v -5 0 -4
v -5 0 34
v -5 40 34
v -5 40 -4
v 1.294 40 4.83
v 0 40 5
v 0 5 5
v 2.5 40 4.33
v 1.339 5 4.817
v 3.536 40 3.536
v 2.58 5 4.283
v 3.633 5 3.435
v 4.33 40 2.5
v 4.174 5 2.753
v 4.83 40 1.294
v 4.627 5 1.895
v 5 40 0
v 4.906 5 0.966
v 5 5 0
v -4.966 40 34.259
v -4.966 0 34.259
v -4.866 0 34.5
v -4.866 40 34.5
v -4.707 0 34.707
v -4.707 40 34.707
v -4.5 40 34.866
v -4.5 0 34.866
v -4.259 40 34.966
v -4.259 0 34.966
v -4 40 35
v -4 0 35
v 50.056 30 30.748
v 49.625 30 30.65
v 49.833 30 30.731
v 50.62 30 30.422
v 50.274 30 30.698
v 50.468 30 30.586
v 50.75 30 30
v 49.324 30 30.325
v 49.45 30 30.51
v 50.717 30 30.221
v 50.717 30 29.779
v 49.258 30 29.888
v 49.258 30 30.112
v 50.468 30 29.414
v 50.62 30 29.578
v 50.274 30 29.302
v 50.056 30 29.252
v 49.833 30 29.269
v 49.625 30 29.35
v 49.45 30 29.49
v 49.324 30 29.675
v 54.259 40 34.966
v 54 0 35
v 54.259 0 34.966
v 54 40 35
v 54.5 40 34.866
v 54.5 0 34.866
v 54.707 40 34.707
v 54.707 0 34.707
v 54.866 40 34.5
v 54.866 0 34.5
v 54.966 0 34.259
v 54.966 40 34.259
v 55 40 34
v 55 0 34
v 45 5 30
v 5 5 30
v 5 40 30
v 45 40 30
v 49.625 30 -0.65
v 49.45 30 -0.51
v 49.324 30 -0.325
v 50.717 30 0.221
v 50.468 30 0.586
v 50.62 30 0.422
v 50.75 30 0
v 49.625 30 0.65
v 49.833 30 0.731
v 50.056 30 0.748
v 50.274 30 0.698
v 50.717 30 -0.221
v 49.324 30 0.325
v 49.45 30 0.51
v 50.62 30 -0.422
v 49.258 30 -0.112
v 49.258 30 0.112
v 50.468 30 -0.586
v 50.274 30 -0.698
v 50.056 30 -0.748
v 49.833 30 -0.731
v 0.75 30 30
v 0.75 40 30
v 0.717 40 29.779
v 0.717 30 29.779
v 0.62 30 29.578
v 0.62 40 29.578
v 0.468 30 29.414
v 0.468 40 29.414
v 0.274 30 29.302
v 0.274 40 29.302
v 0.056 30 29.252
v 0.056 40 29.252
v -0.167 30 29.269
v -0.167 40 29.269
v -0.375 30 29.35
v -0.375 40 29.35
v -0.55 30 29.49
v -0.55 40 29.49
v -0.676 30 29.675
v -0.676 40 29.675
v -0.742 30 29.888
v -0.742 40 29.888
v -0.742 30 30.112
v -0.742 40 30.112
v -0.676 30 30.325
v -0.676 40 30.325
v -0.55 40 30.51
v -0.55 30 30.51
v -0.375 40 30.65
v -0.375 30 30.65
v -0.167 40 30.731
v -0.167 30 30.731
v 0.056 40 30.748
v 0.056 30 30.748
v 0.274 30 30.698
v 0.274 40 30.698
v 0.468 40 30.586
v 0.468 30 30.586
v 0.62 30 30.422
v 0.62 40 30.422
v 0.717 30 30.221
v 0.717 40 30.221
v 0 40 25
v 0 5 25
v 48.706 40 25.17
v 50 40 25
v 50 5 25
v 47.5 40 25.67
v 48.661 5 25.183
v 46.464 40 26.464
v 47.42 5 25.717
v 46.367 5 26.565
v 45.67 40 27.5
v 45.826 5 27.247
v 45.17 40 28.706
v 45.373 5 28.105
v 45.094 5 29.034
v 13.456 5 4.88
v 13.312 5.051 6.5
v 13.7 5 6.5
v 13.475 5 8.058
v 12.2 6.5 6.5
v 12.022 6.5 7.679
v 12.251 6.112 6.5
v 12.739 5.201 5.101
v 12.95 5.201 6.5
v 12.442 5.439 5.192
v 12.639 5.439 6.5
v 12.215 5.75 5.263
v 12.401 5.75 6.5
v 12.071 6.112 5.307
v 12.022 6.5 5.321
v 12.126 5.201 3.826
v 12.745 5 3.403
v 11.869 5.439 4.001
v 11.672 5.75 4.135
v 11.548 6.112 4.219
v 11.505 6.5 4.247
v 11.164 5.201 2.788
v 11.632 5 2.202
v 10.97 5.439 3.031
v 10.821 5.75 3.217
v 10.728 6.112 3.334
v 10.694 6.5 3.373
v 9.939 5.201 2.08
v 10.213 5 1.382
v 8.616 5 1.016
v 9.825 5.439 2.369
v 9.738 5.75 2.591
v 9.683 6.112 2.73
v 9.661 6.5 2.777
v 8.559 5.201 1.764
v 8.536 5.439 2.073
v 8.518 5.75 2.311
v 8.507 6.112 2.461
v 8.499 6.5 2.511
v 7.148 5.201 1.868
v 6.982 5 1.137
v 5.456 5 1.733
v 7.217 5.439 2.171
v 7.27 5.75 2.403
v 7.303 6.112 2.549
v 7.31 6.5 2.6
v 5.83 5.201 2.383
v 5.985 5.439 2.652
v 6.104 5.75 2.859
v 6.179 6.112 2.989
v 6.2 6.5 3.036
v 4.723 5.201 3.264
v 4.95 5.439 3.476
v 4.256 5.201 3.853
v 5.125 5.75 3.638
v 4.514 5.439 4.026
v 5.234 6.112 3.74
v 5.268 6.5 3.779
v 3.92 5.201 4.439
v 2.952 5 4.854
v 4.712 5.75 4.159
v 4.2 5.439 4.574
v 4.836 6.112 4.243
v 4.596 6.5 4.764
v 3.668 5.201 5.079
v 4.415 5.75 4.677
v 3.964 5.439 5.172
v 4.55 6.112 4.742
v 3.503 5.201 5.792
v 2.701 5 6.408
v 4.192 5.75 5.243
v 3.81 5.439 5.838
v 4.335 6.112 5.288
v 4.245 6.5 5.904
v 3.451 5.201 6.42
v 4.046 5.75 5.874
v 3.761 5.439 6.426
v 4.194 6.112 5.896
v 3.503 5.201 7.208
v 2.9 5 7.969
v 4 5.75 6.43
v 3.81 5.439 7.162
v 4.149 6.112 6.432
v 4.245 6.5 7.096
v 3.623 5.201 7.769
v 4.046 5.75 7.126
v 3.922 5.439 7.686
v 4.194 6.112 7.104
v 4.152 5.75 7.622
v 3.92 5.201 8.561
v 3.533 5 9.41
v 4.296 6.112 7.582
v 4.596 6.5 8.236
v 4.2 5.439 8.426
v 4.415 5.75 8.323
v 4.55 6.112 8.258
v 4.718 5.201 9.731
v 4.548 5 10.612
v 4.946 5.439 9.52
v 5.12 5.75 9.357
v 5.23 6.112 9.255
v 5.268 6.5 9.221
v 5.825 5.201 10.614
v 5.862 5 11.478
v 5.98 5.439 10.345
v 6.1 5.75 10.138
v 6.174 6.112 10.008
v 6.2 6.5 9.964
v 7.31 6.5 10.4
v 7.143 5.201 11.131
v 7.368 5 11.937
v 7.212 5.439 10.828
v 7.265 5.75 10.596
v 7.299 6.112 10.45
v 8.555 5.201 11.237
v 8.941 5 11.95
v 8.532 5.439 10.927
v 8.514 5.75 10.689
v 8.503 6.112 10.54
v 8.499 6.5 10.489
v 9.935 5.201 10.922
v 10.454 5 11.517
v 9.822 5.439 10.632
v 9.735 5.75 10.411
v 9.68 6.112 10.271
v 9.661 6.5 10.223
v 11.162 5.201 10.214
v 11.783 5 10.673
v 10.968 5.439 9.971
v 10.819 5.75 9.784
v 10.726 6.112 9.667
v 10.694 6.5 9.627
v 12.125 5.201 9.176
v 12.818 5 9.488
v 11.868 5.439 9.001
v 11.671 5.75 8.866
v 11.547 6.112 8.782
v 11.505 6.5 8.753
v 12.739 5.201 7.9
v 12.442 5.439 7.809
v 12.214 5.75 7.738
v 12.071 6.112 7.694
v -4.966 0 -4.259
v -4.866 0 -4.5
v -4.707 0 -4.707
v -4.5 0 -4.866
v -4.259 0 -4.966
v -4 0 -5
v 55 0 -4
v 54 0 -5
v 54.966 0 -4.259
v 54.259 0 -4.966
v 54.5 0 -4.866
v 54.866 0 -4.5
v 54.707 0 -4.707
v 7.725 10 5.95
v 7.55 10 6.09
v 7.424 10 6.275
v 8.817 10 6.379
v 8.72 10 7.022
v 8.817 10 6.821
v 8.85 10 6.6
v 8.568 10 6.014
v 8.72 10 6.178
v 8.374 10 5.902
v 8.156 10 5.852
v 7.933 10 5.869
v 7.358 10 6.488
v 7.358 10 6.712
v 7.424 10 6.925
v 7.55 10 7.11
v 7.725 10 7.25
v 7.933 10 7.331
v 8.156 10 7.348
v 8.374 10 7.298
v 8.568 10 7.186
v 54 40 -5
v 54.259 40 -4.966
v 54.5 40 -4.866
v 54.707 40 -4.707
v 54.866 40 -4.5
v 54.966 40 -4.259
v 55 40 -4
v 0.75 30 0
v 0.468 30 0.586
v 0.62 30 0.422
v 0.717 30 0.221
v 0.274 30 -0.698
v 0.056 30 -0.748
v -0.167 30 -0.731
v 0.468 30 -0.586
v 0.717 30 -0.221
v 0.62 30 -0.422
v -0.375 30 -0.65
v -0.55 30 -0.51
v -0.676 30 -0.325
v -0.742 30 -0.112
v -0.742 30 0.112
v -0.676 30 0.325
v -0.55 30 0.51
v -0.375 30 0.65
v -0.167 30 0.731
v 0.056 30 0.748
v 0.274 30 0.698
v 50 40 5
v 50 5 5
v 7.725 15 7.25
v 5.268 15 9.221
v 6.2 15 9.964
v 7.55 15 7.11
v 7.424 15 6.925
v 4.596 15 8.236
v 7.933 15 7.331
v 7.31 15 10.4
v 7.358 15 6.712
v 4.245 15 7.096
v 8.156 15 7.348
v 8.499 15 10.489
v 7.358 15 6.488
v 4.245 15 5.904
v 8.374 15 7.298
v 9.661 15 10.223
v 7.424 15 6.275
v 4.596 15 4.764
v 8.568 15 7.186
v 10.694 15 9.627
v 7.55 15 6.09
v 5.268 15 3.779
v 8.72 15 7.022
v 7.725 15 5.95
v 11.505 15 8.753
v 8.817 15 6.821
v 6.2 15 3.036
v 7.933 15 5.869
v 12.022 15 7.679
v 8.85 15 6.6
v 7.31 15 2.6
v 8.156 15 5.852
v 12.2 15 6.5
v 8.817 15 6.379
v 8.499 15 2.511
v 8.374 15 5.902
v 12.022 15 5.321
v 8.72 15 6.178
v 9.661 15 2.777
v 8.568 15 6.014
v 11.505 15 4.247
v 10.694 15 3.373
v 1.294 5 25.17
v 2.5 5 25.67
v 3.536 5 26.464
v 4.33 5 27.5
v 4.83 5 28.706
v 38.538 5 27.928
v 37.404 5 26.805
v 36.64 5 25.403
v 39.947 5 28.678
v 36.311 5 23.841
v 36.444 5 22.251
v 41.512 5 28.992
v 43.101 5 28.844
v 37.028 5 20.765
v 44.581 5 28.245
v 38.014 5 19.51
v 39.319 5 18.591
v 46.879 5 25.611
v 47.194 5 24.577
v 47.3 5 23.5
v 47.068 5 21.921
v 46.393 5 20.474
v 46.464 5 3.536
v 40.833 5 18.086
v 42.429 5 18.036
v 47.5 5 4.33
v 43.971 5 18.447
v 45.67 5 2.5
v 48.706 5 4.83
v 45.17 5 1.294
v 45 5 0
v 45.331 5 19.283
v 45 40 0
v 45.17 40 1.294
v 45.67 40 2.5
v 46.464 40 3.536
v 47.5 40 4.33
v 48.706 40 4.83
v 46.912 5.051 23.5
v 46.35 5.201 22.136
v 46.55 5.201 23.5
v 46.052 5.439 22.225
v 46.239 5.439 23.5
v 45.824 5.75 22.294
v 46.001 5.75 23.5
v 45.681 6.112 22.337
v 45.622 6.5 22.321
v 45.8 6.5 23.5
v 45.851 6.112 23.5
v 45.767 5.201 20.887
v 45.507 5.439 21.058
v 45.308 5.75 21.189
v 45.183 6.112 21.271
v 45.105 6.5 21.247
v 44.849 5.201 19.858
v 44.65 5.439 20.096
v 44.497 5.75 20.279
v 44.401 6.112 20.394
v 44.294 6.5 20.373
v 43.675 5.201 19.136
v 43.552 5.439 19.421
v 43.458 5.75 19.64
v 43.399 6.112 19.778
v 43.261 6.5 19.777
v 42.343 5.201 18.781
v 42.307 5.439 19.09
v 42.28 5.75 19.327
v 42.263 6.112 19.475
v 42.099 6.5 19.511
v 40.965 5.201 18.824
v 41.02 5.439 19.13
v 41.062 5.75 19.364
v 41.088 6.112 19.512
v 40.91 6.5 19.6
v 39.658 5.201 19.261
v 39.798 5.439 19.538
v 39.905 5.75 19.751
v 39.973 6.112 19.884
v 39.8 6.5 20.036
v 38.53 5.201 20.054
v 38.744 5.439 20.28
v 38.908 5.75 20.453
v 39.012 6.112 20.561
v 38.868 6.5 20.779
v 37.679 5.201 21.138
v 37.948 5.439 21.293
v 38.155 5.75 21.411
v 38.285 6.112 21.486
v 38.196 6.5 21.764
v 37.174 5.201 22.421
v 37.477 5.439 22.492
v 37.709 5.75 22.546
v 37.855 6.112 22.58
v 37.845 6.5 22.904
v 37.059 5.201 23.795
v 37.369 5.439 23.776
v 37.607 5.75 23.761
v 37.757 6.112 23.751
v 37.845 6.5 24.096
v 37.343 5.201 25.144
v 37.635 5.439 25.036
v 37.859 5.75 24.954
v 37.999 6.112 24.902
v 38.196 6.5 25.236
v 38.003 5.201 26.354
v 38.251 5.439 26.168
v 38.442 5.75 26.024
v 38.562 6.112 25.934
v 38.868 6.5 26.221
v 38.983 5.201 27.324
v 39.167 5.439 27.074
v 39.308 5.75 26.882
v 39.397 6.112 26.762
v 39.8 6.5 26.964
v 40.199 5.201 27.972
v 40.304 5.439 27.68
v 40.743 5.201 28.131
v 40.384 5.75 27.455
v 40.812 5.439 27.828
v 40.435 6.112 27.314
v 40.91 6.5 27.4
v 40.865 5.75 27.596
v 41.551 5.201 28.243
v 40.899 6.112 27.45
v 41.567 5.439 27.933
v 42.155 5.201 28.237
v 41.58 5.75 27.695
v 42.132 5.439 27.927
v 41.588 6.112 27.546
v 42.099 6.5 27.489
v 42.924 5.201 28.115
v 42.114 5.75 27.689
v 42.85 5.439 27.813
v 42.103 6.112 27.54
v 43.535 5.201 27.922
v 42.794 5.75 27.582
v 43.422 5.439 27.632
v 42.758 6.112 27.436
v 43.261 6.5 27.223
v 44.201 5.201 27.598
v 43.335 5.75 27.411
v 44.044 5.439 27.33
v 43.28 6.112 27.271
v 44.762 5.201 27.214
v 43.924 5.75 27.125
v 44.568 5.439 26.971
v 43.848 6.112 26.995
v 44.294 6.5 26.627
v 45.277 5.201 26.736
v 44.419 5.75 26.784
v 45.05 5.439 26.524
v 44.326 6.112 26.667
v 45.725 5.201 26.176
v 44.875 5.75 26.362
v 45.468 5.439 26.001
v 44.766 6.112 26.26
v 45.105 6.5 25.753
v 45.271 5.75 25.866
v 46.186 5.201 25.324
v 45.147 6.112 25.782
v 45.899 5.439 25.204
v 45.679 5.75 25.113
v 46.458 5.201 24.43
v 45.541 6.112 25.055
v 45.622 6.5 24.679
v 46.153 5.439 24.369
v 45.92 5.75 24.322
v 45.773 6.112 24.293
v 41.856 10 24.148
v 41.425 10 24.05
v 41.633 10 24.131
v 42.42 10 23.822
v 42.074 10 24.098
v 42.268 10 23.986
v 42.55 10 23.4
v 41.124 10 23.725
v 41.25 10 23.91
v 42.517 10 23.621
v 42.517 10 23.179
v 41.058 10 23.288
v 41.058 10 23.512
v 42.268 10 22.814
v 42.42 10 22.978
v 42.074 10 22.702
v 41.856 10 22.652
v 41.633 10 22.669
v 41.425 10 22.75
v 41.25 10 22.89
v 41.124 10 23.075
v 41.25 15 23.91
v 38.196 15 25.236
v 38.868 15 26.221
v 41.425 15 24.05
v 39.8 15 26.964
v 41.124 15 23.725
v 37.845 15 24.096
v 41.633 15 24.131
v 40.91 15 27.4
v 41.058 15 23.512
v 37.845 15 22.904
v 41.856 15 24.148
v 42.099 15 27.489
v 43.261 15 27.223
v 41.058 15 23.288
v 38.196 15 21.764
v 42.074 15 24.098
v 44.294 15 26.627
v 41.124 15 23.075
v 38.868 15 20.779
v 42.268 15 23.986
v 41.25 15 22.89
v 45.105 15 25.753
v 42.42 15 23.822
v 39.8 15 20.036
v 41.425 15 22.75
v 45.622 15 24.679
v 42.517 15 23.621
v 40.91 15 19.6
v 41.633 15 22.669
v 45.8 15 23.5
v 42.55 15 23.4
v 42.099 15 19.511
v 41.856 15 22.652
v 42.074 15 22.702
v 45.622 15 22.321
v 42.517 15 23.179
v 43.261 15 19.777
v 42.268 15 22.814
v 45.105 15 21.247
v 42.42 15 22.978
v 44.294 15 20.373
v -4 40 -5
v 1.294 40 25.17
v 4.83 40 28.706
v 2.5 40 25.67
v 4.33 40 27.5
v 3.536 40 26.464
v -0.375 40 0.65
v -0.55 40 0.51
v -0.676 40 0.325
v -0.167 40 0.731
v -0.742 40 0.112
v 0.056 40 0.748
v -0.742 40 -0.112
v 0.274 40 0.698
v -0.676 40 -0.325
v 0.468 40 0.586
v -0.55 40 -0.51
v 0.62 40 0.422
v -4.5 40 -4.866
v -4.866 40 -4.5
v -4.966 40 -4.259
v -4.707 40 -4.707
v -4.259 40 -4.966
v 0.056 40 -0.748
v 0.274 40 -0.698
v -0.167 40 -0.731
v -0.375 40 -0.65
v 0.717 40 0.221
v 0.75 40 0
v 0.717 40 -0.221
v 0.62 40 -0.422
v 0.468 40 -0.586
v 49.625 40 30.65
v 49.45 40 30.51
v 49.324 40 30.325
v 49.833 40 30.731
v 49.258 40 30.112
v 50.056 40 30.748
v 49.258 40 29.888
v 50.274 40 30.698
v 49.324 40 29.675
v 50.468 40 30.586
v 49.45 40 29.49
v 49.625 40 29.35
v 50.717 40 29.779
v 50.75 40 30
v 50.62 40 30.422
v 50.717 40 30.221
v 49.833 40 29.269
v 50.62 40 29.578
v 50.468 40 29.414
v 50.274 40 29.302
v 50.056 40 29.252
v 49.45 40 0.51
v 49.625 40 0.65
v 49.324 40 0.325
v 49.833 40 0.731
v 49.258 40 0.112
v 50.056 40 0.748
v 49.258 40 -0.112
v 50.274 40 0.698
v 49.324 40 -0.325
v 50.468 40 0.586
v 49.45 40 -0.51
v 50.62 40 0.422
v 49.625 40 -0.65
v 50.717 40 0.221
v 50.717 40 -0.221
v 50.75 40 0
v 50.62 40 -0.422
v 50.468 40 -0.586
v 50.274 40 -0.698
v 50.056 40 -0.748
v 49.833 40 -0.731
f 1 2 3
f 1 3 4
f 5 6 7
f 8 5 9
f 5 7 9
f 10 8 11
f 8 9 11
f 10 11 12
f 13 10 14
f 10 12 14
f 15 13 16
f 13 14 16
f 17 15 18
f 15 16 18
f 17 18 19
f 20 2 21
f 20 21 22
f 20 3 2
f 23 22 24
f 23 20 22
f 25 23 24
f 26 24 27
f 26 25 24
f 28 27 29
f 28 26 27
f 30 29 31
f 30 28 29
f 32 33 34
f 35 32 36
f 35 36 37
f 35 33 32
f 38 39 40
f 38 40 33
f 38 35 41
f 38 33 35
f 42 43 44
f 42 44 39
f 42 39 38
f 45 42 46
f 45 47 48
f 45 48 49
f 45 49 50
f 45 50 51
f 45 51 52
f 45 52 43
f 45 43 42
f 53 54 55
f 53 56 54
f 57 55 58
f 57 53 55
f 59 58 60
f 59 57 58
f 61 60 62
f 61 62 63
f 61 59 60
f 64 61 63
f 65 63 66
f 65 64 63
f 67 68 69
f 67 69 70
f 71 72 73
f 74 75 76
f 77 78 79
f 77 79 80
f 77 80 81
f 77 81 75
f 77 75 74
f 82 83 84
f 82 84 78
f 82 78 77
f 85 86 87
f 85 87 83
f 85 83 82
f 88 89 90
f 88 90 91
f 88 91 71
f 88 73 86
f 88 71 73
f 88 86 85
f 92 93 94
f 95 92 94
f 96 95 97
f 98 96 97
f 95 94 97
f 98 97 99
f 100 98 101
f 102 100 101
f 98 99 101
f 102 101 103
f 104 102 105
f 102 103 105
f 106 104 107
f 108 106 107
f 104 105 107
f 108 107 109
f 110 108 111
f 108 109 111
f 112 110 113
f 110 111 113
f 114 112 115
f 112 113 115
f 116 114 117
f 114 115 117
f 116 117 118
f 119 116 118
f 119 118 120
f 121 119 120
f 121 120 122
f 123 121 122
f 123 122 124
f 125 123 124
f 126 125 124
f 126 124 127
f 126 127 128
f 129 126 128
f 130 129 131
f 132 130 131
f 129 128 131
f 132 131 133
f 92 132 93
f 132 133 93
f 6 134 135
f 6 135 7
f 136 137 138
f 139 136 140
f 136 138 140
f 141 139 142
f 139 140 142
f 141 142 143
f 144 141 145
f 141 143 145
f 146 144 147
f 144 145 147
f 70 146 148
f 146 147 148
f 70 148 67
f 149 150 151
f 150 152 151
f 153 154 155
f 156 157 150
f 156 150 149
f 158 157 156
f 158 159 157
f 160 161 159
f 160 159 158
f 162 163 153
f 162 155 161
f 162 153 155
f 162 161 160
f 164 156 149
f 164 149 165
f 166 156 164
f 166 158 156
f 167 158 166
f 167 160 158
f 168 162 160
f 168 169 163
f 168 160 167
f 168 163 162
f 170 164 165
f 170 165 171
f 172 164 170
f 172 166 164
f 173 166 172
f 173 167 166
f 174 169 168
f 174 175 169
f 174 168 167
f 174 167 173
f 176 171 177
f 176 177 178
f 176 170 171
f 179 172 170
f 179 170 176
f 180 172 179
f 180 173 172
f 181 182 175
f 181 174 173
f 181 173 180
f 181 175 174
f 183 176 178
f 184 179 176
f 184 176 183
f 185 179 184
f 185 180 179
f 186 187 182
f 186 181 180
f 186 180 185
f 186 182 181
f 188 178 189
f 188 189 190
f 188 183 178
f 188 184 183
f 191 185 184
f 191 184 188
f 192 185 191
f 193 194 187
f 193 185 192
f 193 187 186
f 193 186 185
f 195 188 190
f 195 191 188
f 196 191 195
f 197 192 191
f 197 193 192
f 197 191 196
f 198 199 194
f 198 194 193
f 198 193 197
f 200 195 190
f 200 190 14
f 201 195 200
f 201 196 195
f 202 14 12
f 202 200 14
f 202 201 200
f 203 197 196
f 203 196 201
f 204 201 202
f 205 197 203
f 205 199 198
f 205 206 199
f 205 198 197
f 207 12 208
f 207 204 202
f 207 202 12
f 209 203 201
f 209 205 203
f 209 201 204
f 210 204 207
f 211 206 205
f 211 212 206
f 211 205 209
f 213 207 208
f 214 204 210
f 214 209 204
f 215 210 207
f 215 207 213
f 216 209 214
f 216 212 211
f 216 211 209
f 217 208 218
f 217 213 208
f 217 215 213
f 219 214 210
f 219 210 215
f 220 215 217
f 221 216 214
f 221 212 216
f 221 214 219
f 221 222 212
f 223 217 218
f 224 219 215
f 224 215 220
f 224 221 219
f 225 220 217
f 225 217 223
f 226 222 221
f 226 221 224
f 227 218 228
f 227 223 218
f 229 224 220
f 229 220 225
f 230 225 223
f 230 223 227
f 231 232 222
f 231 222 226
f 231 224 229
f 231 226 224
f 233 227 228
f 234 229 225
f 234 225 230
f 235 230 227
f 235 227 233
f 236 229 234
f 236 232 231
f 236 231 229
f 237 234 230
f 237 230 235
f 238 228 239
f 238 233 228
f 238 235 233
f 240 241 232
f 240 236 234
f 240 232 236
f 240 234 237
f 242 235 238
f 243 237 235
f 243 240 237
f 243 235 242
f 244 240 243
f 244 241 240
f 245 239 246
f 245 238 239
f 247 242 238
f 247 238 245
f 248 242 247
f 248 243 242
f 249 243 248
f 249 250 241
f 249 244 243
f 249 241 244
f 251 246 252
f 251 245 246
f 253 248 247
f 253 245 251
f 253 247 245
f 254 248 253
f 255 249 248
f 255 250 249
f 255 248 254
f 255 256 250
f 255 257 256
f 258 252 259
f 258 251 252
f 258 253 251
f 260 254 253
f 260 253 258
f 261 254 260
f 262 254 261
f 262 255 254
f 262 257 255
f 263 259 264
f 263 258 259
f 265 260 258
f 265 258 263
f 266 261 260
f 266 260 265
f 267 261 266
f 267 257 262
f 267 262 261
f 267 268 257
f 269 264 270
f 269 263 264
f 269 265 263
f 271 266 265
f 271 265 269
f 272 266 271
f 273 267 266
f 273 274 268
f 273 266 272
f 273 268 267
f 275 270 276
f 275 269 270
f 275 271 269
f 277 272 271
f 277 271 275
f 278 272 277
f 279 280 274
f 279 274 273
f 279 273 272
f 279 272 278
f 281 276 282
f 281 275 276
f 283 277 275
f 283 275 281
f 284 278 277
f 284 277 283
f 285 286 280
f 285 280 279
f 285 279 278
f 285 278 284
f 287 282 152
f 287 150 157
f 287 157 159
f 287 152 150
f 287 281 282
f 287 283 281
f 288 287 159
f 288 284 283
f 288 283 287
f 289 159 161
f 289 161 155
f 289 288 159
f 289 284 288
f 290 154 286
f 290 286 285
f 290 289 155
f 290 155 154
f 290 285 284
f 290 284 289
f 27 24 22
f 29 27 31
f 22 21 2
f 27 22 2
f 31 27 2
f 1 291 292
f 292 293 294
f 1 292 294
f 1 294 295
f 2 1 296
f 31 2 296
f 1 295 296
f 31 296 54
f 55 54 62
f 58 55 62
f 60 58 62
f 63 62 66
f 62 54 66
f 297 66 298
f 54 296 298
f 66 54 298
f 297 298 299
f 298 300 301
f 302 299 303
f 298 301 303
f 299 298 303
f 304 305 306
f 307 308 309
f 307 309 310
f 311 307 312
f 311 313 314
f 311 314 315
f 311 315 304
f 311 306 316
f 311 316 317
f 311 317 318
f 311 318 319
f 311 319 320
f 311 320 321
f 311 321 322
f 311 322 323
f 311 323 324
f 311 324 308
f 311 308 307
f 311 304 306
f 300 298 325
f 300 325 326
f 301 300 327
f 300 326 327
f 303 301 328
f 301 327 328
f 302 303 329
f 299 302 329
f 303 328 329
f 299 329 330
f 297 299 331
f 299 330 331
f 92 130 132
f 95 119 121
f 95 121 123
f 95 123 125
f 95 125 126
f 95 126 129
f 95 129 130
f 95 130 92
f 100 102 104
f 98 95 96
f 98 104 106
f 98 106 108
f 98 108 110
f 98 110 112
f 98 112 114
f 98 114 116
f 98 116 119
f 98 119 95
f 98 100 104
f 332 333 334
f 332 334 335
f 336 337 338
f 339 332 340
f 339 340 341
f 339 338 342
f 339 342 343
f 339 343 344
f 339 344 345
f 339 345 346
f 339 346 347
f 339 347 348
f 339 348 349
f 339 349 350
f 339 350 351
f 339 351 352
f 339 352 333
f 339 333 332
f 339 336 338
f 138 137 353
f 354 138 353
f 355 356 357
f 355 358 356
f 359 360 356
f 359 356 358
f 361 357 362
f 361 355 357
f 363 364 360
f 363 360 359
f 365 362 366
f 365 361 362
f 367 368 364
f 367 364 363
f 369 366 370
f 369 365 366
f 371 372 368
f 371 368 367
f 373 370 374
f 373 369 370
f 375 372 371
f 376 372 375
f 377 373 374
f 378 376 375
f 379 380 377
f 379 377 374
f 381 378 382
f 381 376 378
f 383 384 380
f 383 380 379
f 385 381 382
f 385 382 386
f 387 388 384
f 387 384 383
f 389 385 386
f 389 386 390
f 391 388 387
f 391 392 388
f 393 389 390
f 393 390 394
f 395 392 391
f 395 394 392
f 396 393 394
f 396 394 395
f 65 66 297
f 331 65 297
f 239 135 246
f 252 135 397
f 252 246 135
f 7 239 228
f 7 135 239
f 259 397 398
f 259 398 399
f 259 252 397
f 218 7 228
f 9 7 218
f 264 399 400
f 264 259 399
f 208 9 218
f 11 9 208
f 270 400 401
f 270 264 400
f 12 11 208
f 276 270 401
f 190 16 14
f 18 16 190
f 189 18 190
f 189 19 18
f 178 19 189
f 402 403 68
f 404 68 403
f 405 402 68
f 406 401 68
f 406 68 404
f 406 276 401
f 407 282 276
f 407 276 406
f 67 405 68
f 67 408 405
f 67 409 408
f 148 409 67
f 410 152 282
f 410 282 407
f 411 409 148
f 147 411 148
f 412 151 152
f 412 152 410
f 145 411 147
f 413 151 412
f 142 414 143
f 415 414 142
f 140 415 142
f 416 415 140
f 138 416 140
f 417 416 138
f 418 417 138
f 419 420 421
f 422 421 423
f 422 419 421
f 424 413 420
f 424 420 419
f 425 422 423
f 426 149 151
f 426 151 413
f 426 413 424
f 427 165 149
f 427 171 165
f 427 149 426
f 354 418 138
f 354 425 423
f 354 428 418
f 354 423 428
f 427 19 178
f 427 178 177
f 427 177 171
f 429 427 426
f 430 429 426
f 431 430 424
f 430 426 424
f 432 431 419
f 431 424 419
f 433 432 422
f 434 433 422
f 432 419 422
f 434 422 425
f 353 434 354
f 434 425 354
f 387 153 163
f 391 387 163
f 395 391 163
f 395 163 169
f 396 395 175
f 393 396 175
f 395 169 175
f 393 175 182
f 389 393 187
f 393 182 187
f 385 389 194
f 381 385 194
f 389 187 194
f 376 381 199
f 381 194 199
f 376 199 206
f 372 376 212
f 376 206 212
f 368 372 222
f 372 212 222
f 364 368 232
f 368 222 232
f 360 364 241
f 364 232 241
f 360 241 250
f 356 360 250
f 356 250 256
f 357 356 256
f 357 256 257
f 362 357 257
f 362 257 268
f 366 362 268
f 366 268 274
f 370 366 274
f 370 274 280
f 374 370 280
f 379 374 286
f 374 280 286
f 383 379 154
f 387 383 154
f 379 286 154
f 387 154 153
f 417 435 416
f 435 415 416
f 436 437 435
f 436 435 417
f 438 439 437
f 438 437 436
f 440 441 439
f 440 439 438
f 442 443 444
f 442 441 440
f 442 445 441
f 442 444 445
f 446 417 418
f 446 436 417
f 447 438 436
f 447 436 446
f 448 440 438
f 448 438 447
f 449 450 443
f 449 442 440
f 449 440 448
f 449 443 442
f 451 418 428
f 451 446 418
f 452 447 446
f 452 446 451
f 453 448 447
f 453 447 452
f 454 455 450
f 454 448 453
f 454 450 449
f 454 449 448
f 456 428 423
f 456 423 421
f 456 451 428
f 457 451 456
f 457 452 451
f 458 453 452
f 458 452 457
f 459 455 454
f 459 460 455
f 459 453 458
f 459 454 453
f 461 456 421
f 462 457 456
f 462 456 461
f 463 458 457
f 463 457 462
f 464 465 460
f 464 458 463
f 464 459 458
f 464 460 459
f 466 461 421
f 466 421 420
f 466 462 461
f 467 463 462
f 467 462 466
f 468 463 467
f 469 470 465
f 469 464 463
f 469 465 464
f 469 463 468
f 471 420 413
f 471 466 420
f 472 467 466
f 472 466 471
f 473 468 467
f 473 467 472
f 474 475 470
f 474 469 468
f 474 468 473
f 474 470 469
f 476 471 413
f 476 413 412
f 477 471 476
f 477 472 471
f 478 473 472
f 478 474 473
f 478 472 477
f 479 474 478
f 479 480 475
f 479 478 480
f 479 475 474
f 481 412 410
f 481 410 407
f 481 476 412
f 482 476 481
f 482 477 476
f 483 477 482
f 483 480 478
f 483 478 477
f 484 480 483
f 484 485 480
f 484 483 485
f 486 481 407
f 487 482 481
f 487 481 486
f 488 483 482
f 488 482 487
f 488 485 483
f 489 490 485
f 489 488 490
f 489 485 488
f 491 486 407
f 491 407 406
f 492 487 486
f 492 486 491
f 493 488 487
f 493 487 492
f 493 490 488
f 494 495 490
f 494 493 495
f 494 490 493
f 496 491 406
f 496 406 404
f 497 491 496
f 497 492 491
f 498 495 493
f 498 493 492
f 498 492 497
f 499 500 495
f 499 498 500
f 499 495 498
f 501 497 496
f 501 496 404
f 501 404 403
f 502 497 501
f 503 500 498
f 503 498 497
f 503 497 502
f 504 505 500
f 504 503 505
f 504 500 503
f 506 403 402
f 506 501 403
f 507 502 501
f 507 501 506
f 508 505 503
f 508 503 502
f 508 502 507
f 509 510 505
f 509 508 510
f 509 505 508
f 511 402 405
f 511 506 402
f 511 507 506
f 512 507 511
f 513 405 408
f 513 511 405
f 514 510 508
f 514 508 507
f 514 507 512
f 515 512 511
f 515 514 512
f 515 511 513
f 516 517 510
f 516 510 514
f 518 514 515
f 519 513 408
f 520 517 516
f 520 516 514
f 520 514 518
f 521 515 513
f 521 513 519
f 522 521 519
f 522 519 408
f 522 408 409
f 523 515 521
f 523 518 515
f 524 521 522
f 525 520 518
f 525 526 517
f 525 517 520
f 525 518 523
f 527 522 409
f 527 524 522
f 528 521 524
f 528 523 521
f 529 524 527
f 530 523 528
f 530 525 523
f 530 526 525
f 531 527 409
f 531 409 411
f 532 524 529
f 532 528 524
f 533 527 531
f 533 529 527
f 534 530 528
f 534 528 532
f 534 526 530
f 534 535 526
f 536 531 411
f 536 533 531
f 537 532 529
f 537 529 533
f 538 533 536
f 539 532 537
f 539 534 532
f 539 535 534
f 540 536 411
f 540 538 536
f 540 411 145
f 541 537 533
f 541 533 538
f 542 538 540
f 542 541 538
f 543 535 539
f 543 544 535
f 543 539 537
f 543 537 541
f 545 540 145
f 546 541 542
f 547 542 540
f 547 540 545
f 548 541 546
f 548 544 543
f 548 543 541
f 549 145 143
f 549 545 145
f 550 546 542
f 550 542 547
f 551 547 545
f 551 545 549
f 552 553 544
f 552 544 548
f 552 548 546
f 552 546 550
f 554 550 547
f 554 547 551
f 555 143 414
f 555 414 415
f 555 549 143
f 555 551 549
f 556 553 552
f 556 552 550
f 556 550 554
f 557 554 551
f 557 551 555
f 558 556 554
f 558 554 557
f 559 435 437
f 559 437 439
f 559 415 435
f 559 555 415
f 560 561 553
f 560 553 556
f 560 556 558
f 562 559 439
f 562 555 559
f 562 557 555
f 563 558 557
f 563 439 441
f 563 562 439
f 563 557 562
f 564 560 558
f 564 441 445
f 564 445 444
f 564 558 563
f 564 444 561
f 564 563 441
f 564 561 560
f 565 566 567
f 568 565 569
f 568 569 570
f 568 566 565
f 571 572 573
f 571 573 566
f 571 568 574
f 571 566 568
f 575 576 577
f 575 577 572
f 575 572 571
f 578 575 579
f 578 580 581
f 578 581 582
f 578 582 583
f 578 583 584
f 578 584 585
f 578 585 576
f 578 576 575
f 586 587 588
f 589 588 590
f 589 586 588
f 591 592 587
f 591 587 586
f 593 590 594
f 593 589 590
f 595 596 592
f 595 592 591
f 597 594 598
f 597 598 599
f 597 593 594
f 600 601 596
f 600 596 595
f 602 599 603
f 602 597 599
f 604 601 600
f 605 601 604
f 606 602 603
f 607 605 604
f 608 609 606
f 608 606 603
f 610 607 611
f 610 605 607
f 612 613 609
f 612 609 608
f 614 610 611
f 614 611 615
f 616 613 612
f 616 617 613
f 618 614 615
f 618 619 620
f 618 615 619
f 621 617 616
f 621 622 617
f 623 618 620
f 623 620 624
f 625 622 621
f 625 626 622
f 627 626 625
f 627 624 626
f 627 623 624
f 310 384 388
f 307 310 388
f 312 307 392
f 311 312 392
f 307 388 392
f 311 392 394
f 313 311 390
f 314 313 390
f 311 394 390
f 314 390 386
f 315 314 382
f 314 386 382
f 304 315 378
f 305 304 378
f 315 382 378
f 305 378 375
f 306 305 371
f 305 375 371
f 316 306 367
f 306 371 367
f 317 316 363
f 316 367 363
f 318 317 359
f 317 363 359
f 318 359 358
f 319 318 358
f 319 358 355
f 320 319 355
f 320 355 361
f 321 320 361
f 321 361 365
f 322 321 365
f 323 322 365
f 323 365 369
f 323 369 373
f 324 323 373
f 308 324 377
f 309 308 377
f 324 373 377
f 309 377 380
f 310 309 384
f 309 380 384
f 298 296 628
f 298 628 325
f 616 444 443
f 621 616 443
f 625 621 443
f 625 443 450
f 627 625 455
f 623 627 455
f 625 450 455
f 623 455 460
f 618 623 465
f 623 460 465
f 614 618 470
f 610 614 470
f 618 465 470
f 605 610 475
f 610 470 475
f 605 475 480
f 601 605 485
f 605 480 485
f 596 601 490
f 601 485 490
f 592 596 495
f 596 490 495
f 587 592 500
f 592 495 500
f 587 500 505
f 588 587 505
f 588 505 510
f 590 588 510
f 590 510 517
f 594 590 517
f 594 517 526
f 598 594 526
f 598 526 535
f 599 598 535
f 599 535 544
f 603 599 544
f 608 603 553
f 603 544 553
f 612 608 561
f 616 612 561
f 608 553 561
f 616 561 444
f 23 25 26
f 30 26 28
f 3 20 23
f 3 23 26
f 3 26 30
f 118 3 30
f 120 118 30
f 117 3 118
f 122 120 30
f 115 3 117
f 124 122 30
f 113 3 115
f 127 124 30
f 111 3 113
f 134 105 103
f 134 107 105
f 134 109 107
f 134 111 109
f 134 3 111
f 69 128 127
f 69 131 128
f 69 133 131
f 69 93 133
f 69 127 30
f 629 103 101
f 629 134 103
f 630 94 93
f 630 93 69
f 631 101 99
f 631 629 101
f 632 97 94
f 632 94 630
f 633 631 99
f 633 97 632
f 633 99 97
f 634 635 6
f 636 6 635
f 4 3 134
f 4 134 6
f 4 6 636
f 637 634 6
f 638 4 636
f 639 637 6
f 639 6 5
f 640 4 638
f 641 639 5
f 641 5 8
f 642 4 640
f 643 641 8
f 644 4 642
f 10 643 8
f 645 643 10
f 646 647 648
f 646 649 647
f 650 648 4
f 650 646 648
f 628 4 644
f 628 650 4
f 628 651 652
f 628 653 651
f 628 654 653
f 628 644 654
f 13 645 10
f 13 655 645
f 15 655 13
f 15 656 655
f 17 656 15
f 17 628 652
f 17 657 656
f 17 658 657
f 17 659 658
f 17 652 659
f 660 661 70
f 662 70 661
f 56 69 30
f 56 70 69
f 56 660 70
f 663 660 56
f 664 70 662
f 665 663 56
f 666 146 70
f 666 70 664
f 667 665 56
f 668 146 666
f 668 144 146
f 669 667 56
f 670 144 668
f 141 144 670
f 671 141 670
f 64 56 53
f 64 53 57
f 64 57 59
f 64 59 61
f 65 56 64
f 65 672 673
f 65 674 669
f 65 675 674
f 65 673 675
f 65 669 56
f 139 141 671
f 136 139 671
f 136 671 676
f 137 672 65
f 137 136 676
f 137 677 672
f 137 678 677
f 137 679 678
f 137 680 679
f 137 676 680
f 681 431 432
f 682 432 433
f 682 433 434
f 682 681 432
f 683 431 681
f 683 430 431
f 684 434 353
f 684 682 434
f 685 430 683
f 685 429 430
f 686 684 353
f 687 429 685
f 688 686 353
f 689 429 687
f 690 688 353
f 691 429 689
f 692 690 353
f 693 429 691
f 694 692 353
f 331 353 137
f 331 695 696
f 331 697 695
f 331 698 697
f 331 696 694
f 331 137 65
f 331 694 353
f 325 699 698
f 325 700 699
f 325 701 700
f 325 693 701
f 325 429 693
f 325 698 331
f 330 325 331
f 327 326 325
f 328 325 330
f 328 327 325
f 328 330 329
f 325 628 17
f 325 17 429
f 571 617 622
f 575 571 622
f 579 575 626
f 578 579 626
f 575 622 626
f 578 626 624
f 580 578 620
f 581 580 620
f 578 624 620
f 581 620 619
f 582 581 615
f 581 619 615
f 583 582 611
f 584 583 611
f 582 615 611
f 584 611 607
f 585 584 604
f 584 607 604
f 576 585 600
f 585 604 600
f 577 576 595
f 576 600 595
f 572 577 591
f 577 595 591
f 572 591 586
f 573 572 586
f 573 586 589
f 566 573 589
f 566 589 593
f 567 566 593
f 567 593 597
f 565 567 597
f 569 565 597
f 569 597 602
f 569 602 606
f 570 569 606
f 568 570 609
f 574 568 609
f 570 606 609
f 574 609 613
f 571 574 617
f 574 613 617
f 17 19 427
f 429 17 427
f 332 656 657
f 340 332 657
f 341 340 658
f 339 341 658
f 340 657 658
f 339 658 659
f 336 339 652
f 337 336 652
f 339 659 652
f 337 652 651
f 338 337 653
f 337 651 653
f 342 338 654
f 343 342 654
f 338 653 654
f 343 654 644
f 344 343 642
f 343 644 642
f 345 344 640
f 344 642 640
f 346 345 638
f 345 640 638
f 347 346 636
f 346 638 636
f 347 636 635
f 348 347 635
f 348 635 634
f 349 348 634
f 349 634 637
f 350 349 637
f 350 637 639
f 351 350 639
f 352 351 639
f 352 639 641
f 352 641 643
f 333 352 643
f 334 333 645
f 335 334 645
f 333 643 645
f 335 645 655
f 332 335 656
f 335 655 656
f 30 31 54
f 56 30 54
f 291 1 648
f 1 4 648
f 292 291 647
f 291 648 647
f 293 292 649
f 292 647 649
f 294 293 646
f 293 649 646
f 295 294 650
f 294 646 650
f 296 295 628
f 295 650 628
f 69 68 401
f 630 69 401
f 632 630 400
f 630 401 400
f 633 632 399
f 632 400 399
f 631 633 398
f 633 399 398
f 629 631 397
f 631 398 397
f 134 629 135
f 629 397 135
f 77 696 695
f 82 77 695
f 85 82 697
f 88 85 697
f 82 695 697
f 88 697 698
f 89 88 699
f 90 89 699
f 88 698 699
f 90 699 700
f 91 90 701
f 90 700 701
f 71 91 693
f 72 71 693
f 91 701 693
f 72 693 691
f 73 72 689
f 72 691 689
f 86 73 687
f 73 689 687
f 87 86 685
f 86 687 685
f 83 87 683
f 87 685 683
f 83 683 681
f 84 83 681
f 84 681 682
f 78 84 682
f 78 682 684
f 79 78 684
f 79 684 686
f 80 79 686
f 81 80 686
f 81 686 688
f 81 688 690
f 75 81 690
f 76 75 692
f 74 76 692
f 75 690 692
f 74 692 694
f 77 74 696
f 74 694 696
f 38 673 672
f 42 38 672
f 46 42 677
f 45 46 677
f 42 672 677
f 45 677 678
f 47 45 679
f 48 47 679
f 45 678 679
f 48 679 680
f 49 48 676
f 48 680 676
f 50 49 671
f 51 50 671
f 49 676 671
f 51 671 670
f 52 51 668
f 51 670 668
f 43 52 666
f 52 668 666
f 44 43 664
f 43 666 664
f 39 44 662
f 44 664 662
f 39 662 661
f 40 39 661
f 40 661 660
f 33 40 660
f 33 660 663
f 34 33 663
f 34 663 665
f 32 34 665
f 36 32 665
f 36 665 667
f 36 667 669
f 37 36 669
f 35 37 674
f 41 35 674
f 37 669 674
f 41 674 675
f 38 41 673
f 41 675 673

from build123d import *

# Parameters (mm, degrees)
SKETCH1_W           = 50
SKETCH1_H           = 30
BOSS_EXTRUDE1_DEPTH = 5
SKETCH1_3_W         = 60
SKETCH1_3_H         = 40
SKETCH1_3_W_2       = 50
SKETCH1_3_H_2       = 30
BOSS_EXTRUDE2_DEPTH = 40
SKETCH2_R           = 4
BOSS_EXTRUDE3_DEPTH = 10
SKETCH6_R           = 0.75
CUT_EXTRUDE1_DEPTH  = 5
FILLET1_R           = 1.5
BOSS_EXTRUDE4_START = -1e-06
BOSS_EXTRUDE4_DEPTH = 35.000001
SKETCH10_R          = 0.75
CUT_EXTRUDE2_DEPTH  = 10
FILLET2_R           = 1


with BuildPart() as part:
    # Sketch1 → Boss-Extrude1 (new body)
    with BuildSketch(Plane(origin=(0, 0, 0), x_dir=(1, 0, 0), z_dir=(0, 1, 0))):
        with Locations((25, -15)):
            Rectangle(SKETCH1_W, SKETCH1_H)
    extrude(amount=BOSS_EXTRUDE1_DEPTH)

    # Sketch1<3> → Boss-Extrude2 (add)
    with BuildSketch(Plane(origin=(0, 0, 0), x_dir=(1, 0, 0), z_dir=(0, 1, 0))):
        with Locations((25, -15)):
            Rectangle(SKETCH1_3_W, SKETCH1_3_H)
        with Locations((25, -15)):
            Rectangle(SKETCH1_3_W_2, SKETCH1_3_H_2, mode=Mode.SUBTRACT)
    extrude(amount=BOSS_EXTRUDE2_DEPTH)

    # Sketch2 → Boss-Extrude3 (add)
    with BuildSketch(Plane(origin=(0, 5, 0), x_dir=(1, 0, 0), z_dir=(0, 1, 0))):
        with Locations((8.2, -6.5)):
            Circle(SKETCH2_R)
        with Locations((41.8, -23.5)):
            Circle(SKETCH2_R)
    extrude(amount=BOSS_EXTRUDE3_DEPTH)

    # Sketch6 → Cut-Extrude1 (cut)
    with BuildSketch(Plane(origin=(0, 15, 0), x_dir=(1, 0, 0), z_dir=(0, 1, 0))):
        with Locations((41.8, -23.4)):
            Circle(SKETCH6_R)
        with Locations((8.1, -6.6)):
            Circle(SKETCH6_R)
    extrude(amount=-CUT_EXTRUDE1_DEPTH, mode=Mode.SUBTRACT)

    # Fillet1
    fillet1_edges = [part.edges().sort_by_distance(p)[0] for p in [
        (4.2, 5, 6.5),
        (37.8, 5, 23.5),
    ]]
    fillet(fillet1_edges, radius=FILLET1_R)

    # Sketch9 → Boss-Extrude4 (add)
    with BuildSketch(Plane(origin=(0, 5, 0), x_dir=(1, 0, 0), z_dir=(0, 1, 0)).offset(BOSS_EXTRUDE4_START)):
        with BuildLine():
            Line((5, 0), (0, 0))
            Line((0, 0), (0, -5))
            ThreePointArc((0, -5), (3.535533906, -3.535533906), (5, 0))
        make_face()
        with BuildLine():
            Line((50, -5), (50, 0))
            Line((50, 0), (45, 0))
            ThreePointArc((45, 0), (46.464466094, -3.535533906), (50, -5))
        make_face()
        with BuildLine():
            Line((45, -30), (50, -30))
            Line((50, -30), (50, -25))
            ThreePointArc((50, -25), (46.464466094, -26.464466094), (45, -30))
        make_face()
        with BuildLine():
            Line((0, -25), (0, -30))
            Line((0, -30), (5, -30))
            ThreePointArc((5, -30), (3.535533906, -26.464466094), (0, -25))
        make_face()
    extrude(amount=BOSS_EXTRUDE4_DEPTH)

    # Sketch10 → Cut-Extrude2 (cut)
    with BuildSketch(Plane(origin=(0, 40, 0), x_dir=(1, 0, 0), z_dir=(0, 1, 0))):
        with Locations((50, -30)):
            Circle(SKETCH10_R)
        with Locations((0, -30)):
            Circle(SKETCH10_R)
        with Locations((50, 0)):
            Circle(SKETCH10_R)
        Circle(SKETCH10_R)
    extrude(amount=-CUT_EXTRUDE2_DEPTH, mode=Mode.SUBTRACT)

    # Fillet2
    fillet2_edges = [part.edges().sort_by_distance(p)[0] for p in [
        (-5, 20, -5),
        (-5, 20, 35),
        (55, 20, 35),
        (55, 20, -5),
    ]]
    fillet(fillet2_edges, radius=FILLET2_R)


solid = part.part
